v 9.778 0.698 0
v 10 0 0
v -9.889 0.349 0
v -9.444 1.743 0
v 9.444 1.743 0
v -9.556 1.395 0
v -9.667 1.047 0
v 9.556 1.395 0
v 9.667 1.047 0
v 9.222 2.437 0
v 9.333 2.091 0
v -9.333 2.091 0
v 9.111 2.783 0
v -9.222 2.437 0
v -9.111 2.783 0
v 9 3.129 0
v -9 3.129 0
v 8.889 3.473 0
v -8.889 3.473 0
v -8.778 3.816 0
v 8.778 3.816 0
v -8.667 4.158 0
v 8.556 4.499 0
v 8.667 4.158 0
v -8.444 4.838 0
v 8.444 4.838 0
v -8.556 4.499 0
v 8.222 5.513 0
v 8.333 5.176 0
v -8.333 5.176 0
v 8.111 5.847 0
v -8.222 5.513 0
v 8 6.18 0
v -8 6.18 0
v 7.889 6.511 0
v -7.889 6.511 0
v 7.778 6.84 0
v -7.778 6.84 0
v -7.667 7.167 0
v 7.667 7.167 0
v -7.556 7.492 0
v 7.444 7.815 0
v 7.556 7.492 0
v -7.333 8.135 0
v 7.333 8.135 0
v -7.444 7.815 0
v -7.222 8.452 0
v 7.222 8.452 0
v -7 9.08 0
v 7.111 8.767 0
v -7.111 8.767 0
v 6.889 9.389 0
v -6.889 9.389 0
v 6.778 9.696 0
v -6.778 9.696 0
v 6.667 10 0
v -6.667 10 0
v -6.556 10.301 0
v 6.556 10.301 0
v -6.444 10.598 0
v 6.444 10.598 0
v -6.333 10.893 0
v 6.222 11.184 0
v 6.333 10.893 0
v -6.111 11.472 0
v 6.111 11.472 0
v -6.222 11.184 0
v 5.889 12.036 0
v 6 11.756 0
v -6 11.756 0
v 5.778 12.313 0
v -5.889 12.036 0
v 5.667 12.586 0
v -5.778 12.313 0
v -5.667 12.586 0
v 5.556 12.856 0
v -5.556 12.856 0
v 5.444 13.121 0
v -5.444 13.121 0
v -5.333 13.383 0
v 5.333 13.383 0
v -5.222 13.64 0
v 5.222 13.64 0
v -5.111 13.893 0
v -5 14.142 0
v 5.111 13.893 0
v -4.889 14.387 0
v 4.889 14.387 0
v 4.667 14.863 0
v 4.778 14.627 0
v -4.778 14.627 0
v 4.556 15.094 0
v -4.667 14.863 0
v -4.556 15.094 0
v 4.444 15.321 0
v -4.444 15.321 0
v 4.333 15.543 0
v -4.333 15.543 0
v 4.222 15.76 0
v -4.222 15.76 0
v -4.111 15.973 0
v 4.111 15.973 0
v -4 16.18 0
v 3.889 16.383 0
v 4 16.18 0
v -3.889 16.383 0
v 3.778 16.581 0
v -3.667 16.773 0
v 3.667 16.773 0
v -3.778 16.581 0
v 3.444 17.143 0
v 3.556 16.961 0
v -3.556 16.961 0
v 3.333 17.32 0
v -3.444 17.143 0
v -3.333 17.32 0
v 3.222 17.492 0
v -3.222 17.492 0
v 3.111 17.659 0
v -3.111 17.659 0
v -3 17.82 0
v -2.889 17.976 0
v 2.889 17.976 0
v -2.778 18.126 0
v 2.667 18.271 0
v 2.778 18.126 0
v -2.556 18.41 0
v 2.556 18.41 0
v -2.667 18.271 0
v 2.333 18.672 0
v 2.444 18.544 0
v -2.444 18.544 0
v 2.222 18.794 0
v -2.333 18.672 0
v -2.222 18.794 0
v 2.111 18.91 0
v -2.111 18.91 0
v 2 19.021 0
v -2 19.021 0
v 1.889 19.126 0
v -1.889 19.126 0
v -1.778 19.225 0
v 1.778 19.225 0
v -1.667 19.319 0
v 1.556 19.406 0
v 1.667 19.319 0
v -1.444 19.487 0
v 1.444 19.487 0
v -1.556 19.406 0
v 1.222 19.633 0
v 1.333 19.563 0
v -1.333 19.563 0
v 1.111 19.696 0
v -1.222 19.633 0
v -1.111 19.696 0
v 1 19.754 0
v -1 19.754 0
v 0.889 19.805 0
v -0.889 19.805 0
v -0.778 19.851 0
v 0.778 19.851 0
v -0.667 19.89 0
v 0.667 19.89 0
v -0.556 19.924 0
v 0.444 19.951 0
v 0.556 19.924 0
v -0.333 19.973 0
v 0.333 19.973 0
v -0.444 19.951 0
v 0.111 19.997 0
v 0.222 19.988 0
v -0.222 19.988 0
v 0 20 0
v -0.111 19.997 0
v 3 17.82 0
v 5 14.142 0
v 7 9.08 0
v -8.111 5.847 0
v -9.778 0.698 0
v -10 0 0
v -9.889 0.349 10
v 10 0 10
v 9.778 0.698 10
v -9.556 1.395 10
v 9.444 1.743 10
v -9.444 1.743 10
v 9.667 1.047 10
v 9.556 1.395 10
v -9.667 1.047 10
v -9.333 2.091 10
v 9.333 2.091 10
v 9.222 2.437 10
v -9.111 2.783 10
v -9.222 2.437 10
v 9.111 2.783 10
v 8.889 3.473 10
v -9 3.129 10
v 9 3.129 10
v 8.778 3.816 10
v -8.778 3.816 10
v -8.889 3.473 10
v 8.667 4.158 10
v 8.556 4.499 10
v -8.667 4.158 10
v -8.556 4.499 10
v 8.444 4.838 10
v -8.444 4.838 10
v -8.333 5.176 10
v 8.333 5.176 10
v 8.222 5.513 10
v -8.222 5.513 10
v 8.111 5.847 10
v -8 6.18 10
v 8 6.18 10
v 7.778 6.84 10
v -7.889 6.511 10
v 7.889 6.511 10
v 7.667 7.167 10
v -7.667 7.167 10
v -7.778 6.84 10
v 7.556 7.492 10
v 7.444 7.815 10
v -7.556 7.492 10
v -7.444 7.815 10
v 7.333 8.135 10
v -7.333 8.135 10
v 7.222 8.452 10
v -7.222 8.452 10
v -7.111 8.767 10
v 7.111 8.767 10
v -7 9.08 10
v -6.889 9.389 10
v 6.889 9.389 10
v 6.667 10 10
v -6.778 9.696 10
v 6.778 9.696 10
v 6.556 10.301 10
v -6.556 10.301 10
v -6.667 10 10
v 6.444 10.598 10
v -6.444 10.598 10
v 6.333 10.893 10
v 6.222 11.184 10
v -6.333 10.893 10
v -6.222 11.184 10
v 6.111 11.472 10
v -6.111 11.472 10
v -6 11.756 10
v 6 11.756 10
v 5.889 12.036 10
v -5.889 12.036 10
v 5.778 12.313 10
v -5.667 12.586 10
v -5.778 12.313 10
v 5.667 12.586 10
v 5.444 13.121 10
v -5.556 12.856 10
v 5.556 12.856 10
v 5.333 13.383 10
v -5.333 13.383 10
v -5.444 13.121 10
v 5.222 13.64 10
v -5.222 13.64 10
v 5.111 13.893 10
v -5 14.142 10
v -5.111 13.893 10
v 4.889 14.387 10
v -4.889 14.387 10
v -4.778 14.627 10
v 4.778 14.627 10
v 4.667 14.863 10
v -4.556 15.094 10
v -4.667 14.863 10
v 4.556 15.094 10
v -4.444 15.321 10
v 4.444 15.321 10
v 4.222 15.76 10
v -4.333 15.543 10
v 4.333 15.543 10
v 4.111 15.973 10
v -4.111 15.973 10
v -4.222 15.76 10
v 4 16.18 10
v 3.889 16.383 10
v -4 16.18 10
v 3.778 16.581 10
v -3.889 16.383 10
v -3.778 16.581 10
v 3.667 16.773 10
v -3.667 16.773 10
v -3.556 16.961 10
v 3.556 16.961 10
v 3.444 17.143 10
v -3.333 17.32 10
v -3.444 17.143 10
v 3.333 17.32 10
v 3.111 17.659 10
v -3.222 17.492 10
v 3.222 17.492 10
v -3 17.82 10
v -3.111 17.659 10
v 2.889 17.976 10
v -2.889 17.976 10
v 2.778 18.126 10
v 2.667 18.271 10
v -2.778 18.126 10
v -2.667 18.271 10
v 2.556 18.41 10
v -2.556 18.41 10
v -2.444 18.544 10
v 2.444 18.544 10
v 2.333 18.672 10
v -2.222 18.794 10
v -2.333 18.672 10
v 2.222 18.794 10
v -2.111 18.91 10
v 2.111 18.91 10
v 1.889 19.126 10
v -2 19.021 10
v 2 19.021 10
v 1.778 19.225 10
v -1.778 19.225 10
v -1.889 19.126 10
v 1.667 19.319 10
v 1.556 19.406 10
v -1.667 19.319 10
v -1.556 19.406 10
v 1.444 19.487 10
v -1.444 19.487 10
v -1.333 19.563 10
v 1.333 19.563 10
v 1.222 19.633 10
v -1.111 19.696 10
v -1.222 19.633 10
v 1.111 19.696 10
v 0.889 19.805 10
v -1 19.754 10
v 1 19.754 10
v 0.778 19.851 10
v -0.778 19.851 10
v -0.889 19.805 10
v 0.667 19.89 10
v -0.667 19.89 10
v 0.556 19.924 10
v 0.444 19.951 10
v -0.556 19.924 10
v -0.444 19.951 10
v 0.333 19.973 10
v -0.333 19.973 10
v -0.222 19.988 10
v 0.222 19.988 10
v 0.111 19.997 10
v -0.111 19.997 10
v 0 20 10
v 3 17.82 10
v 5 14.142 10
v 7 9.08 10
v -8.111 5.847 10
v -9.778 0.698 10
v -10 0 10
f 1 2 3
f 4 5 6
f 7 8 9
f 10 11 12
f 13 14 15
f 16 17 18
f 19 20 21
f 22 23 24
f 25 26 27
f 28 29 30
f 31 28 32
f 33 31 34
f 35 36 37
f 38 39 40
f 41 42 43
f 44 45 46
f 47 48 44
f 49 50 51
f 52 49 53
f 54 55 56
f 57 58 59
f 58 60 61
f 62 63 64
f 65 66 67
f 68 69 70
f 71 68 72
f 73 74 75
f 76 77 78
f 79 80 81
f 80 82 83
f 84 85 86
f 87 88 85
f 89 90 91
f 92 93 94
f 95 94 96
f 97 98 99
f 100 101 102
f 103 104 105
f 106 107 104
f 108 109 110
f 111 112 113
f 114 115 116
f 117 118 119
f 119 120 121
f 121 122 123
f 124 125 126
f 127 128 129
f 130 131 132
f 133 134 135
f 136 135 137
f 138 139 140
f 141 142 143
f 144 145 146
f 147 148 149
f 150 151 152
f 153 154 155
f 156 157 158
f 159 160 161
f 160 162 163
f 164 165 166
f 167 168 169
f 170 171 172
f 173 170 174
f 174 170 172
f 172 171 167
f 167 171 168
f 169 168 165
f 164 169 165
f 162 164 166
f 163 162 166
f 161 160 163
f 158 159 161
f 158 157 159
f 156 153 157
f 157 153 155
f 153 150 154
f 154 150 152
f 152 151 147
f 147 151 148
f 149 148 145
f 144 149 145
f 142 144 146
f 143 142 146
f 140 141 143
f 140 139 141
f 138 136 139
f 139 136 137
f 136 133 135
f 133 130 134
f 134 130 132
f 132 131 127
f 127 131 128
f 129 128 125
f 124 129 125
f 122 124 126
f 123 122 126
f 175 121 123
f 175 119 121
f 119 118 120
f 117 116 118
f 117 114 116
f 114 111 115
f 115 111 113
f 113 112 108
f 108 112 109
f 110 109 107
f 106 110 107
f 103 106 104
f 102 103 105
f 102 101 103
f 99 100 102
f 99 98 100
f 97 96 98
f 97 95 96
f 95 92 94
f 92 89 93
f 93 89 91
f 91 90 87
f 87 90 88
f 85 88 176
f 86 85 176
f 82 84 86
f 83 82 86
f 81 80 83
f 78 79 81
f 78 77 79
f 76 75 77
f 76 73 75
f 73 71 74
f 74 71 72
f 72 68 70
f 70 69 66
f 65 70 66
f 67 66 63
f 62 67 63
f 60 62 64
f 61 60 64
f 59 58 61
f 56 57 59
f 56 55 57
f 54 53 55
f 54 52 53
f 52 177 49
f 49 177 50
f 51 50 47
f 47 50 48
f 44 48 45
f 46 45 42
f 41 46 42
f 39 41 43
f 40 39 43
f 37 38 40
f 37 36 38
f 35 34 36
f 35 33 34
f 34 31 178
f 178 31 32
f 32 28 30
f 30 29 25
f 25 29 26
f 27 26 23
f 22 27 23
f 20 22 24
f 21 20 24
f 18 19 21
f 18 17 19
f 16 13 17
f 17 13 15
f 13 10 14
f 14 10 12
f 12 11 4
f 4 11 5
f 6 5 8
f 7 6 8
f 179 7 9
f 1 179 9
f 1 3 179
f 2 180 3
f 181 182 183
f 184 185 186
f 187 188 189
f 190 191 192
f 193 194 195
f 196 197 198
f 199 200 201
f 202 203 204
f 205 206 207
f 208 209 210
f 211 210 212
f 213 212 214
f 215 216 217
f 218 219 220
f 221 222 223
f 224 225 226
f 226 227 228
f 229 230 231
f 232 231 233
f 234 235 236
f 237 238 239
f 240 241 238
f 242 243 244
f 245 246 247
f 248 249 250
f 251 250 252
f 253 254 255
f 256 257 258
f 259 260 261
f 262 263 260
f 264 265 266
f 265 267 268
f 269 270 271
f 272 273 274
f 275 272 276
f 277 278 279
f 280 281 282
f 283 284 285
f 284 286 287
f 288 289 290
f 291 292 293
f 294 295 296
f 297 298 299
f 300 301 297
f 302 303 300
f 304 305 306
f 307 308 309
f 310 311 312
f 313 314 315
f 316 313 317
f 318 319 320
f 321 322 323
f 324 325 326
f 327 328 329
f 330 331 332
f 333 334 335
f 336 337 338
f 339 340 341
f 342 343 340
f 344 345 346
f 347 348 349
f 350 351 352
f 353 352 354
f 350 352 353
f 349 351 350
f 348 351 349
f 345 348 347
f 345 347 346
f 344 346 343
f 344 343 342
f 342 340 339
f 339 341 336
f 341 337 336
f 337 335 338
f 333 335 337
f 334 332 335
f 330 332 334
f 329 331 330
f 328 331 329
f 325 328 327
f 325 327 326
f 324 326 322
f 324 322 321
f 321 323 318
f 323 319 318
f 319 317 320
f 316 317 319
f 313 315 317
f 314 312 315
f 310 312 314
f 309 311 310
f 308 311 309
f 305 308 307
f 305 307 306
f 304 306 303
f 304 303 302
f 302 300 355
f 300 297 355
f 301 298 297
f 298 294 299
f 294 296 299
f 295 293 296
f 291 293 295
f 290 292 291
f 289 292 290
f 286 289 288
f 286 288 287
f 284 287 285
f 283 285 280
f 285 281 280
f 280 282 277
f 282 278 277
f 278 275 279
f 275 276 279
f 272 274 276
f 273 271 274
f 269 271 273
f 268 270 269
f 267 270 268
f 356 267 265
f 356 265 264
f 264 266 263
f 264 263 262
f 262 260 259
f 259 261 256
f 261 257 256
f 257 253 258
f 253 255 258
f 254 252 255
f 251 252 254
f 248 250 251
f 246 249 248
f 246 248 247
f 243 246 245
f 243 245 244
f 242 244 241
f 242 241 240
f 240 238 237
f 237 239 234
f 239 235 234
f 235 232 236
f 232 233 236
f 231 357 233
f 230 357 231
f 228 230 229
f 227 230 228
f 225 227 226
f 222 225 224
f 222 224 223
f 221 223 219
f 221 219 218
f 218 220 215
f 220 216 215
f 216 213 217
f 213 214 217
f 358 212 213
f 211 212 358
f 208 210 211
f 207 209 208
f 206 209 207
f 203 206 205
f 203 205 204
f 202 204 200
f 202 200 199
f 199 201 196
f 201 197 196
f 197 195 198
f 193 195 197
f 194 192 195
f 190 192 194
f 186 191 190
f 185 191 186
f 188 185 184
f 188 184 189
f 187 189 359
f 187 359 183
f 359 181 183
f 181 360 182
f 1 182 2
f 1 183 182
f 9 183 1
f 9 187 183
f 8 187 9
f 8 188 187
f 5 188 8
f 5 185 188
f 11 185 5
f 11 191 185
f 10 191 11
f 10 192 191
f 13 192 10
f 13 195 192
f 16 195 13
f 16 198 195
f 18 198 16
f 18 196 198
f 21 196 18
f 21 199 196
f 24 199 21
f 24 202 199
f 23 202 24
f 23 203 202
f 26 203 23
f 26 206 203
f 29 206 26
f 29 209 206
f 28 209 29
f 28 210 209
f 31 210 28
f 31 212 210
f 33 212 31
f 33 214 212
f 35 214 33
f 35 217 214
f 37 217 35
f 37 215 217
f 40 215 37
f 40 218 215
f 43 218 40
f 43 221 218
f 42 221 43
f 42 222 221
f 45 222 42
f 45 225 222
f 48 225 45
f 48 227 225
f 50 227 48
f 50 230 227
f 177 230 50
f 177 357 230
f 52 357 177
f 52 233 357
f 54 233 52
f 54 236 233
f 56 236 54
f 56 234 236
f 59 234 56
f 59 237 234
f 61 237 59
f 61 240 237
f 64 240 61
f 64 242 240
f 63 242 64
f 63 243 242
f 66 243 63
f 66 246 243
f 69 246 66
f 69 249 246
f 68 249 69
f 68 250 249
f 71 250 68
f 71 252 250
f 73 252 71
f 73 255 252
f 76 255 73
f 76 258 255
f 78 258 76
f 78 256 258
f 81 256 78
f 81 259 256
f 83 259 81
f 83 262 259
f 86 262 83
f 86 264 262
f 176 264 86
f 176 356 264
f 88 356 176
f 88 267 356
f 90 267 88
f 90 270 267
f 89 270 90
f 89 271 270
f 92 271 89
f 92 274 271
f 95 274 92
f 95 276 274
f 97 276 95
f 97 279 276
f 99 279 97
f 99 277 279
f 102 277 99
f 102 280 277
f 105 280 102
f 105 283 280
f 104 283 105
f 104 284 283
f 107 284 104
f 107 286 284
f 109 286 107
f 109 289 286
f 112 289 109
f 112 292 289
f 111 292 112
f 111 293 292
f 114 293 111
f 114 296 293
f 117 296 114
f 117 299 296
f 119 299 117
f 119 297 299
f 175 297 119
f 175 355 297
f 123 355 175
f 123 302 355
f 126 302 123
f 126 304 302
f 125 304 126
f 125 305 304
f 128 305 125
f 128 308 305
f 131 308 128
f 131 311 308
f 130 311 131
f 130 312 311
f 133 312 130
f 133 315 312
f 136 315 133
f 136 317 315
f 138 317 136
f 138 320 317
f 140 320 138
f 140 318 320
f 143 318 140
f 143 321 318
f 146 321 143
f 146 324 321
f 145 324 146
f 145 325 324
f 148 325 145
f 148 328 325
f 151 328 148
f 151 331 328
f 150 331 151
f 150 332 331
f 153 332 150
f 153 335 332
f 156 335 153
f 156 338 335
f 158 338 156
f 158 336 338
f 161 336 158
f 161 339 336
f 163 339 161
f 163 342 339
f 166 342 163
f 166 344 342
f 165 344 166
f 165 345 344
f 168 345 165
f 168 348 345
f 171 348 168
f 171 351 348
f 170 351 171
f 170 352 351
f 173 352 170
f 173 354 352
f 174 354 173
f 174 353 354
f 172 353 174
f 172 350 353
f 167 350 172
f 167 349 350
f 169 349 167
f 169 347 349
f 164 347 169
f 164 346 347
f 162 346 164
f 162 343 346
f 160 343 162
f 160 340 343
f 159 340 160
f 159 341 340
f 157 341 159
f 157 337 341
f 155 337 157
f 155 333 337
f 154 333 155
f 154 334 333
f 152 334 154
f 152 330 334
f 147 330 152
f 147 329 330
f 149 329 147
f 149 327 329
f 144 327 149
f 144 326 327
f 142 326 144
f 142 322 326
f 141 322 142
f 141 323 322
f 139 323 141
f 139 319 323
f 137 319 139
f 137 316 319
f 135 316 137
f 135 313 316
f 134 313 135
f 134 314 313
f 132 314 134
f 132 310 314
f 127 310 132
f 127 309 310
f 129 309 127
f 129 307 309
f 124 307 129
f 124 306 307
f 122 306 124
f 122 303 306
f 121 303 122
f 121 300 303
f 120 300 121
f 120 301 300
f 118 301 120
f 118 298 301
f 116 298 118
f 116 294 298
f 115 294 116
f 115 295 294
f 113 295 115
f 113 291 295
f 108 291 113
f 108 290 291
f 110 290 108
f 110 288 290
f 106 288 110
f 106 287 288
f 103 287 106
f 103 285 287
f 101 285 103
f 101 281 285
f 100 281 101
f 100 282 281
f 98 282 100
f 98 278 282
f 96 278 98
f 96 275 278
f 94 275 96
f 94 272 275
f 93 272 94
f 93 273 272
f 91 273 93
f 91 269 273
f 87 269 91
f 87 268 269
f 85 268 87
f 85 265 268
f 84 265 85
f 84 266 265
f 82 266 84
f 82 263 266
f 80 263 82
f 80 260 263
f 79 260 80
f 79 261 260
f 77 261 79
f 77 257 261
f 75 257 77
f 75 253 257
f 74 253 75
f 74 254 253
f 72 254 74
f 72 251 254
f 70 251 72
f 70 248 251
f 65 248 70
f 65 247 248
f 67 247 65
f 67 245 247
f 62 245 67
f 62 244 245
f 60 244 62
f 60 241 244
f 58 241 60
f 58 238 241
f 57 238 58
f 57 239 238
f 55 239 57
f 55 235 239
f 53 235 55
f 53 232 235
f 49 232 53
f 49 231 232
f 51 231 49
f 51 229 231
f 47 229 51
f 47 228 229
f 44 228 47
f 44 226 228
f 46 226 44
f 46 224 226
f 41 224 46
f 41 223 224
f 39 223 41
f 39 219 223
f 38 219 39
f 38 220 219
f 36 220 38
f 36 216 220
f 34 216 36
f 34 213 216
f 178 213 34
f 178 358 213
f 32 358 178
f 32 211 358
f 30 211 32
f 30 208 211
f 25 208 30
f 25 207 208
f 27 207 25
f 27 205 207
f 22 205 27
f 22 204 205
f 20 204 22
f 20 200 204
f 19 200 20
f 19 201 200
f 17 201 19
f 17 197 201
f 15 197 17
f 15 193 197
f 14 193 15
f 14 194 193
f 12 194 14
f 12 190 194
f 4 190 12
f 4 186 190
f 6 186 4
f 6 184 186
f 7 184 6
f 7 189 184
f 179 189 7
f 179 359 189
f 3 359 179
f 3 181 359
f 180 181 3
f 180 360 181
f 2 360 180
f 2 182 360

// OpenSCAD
// unit sine-wave 0-359 deg for doing projections onto other solids
// below python code used to print points list:

/*
import numpy as np
"""
output a list of points consumable by openscad polygon function
"""

def wave(degs, scale=10):
    pts = []
    for i in xrange(degs):
        rad = i*np.pi/180.0
        x = float(i/180.0*scale)
        y=np.sin(rad) * scale
        pts.append([x, y])
    return pts

def pwave(degs, scale=20):
    # default scale of 20 would give: 0 < x < 40 units
    print("sinepoints = {};".format(wave(degs, scale=scale)))
    print("*** finito ***")
    return 0

if __name__ == "__main__":
    pwave(359, scale=100)
*/


sinepoints = [[0.0, 0.0], [0.11111111111111112, 0.34904812874567026], [0.22222222222222224, 0.69798993405001941], [0.3333333333333333, 1.0467191248588765], [0.4444444444444445, 1.395129474882506], [0.5555555555555556, 1.7431148549531632], [0.6666666666666666, 2.0905692653530692], [0.7777777777777778, 2.4373868681029496], [0.888888888888889, 2.7834620192013086], [1.0, 3.1286893008046173], [1.1111111111111112, 3.4729635533386065], [1.222222222222222, 3.8161799075308962], [1.3333333333333333, 4.1582338163551862], [1.4444444444444442, 4.4990210868773], [1.5555555555555556, 4.8384379119933545], [1.6666666666666665, 5.1763809020504148], [1.777777777777778, 5.512747116339983], [1.8888888888888888, 5.8474340944547354], [2.0, 6.1803398874989481], [2.111111111111111, 6.5113630891431331], [2.2222222222222223, 6.840402866513374], [2.3333333333333335, 7.1673589909060054], [2.444444444444444, 7.4921318683182401], [2.5555555555555554, 7.8146225697854739], [2.6666666666666665, 8.1347328615160031], [2.7777777777777777, 8.452365234813989], [2.8888888888888884, 8.7674229357815481], [3.0, 9.079809994790935], [3.111111111111111, 9.3894312557178168], [3.2222222222222223, 9.6961924049267409], [3.333333333333333, 9.9999999999999982], [3.4444444444444446, 10.300761498201084], [3.555555555555556, 10.598385284664097], [3.6666666666666665, 10.892780700300541], [3.7777777777777777, 11.183858069414939], [3.888888888888889, 11.471528727020921], [4.0, 11.755705045849464], [4.111111111111111, 12.036300463040966], [4.222222222222222, 12.313229506513164], [4.333333333333334, 12.586407820996747], [4.444444444444445, 12.855752193730785], [4.555555555555555, 13.121180579810144], [4.666666666666667, 13.382612127177165], [4.777777777777778, 13.63996720124997], [4.888888888888888, 13.893167409179945], [5.0, 14.142135623730949], [5.111111111111111, 14.386796006773022], [5.222222222222222, 14.627074032383408], [5.333333333333333, 14.862896509547882], [5.444444444444444, 15.094191604455441], [5.555555555555555, 15.32088886237956], [5.666666666666666, 15.542919229139416], [5.777777777777777, 15.760215072134439], [5.888888888888889, 15.972710200945857], [6.0, 16.180339887498949], [6.111111111111112, 16.383040885779835], [6.222222222222222, 16.580751451100834], [6.333333333333333, 16.773411358908479], [6.444444444444445, 16.960961923128519], [6.555555555555555, 17.143346014042244], [6.666666666666666, 17.320508075688771], [6.777777777777779, 17.492394142787916], [6.888888888888889, 17.658951857178536], [7.0, 17.820130483767358], [7.111111111111112, 17.97588092598334], [7.222222222222222, 18.126155740732997], [7.333333333333333, 18.270909152852017], [7.444444444444445, 18.410097069048806], [7.555555555555555, 18.543677091335748], [7.666666666666667, 18.671608529944034], [7.777777777777778, 18.793852415718167], [7.888888888888888, 18.910371511986334], [8.0, 19.021130325903069], [8.11111111111111, 19.126095119260707], [8.222222222222221, 19.225233918766378], [8.333333333333334, 19.318516525781366], [8.444444444444445, 19.405914525519929], [8.555555555555555, 19.487401295704704], [8.666666666666668, 19.56295201467611], [8.777777777777779, 19.632543668953279], [8.88888888888889, 19.696155060244159], [9.0, 19.753766811902757], [9.11111111111111, 19.805361374831406], [9.222222222222223, 19.85092303282644], [9.333333333333334, 19.890437907365467], [9.444444444444445, 19.92389396183491], [9.555555555555555, 19.951281005196485], [9.666666666666666, 19.972590695091476], [9.777777777777777, 19.987816540381914], [9.88888888888889, 19.996953903127825], [10.0, 20.0], [10.11111111111111, 19.996953903127825], [10.222222222222221, 19.987816540381914], [10.333333333333334, 19.972590695091476], [10.444444444444445, 19.951281005196485], [10.555555555555555, 19.92389396183491], [10.666666666666666, 19.890437907365467], [10.777777777777777, 19.850923032826444], [10.888888888888888, 19.805361374831406], [11.0, 19.753766811902754], [11.11111111111111, 19.696155060244159], [11.222222222222221, 19.632543668953279], [11.333333333333332, 19.562952014676114], [11.444444444444443, 19.487401295704704], [11.555555555555554, 19.405914525519929], [11.666666666666668, 19.318516525781366], [11.777777777777779, 19.225233918766378], [11.88888888888889, 19.126095119260711], [12.0, 19.021130325903073], [12.11111111111111, 18.910371511986337], [12.222222222222223, 18.79385241571817], [12.333333333333334, 18.671608529944034], [12.444444444444445, 18.543677091335748], [12.555555555555555, 18.410097069048806], [12.666666666666666, 18.27090915285202], [12.777777777777777, 18.126155740733001], [12.88888888888889, 17.97588092598334], [13.0, 17.820130483767358], [13.11111111111111, 17.658951857178543], [13.222222222222221, 17.492394142787916], [13.333333333333332, 17.320508075688775], [13.444444444444446, 17.143346014042248], [13.555555555555557, 16.960961923128522], [13.666666666666668, 16.773411358908479], [13.777777777777779, 16.580751451100834], [13.88888888888889, 16.383040885779842], [14.0, 16.180339887498949], [14.111111111111112, 15.972710200945855], [14.222222222222223, 15.760215072134439], [14.333333333333334, 15.54291922913942], [14.444444444444445, 15.32088886237956], [14.555555555555555, 15.094191604455435], [14.666666666666666, 14.862896509547884], [14.777777777777779, 14.627074032383412], [14.88888888888889, 14.386796006773029], [15.0, 14.142135623730951], [15.11111111111111, 13.893167409179943], [15.222222222222221, 13.639967201249972], [15.333333333333334, 13.382612127177167], [15.444444444444445, 13.121180579810146], [15.555555555555555, 12.85575219373079], [15.666666666666666, 12.586407820996754], [15.777777777777777, 12.313229506513167], [15.888888888888888, 12.036300463040963], [16.0, 11.755705045849465], [16.11111111111111, 11.471528727020928], [16.22222222222222, 11.183858069414939], [16.333333333333332, 10.892780700300539], [16.444444444444443, 10.598385284664097], [16.555555555555554, 10.300761498201087], [16.666666666666668, 9.9999999999999982], [16.77777777777778, 9.6961924049267427], [16.88888888888889, 9.3894312557178221], [17.0, 9.0798099947909368], [17.11111111111111, 8.7674229357815463], [17.22222222222222, 8.452365234813989], [17.333333333333336, 8.1347328615160084], [17.444444444444443, 7.8146225697854828], [17.555555555555557, 7.4921318683182445], [17.666666666666664, 7.1673589909060045], [17.77777777777778, 6.8404028665133776], [17.88888888888889, 6.5113630891431402], [18.0, 6.1803398874989499], [18.11111111111111, 5.8474340944547407], [18.22222222222222, 5.5127471163399928], [18.333333333333332, 5.1763809020504201], [18.444444444444446, 4.8384379119933545], [18.555555555555557, 4.4990210868772955], [18.666666666666668, 4.1582338163551862], [18.77777777777778, 3.8161799075308993], [18.88888888888889, 3.4729635533386056], [19.0, 3.1286893008046195], [19.11111111111111, 2.7834620192013149], [19.22222222222222, 2.4373868681029509], [19.333333333333332, 2.0905692653530745], [19.444444444444443, 1.7431148549531728], [19.555555555555554, 1.3951294748825105], [19.666666666666664, 1.0467191248588761], [19.77777777777778, 0.69798993405001397], [19.88888888888889, 0.34904812874566876], [20.0, 2.4492935982947065e-15], [20.11111111111111, -0.34904812874566382], [20.22222222222222, -0.69798993405001797], [20.333333333333332, -1.0467191248588712], [20.444444444444443, -1.3951294748824967], [20.555555555555554, -1.7431148549531588], [20.666666666666668, -2.0905692653530612], [20.77777777777778, -2.4373868681029549], [20.88888888888889, -2.7834620192013104], [21.0, -3.1286893008046146], [21.11111111111111, -3.4729635533386096], [21.22222222222222, -3.8161799075308944], [21.333333333333332, -4.1582338163551817], [21.444444444444443, -4.4990210868772991], [21.555555555555554, -4.83843791199335], [21.666666666666664, -5.1763809020504068], [21.777777777777775, -5.5127471163399804], [21.888888888888893, -5.8474340944547274], [22.0, -6.1803398874989544], [22.111111111111114, -6.5113630891431349], [22.22222222222222, -6.8404028665133731], [22.333333333333336, -7.1673589909060089], [22.444444444444443, -7.4921318683182401], [22.555555555555557, -7.8146225697854712], [22.666666666666664, -8.1347328615159959], [22.77777777777778, -8.4523652348139855], [22.888888888888886, -8.767422935781541], [23.0, -9.0798099947909243], [23.111111111111107, -9.3894312557178168], [23.222222222222225, -9.6961924049267392], [23.333333333333336, -10.000000000000002], [23.444444444444446, -10.300761498201084], [23.555555555555557, -10.598385284664095], [23.666666666666668, -10.892780700300541], [23.77777777777778, -11.183858069414933], [23.88888888888889, -11.471528727020917], [24.0, -11.75570504584946], [24.11111111111111, -12.036300463040961], [24.22222222222222, -12.313229506513157], [24.333333333333332, -12.586407820996753], [24.444444444444446, -12.855752193730785], [24.555555555555557, -13.121180579810147], [24.666666666666668, -13.382612127177165], [24.77777777777778, -13.639967201249966], [24.88888888888889, -13.893167409179947], [25.0, -14.142135623730949], [25.11111111111111, -14.386796006773018], [25.22222222222222, -14.627074032383403], [25.333333333333332, -14.86289650954788], [25.444444444444443, -15.094191604455434], [25.555555555555554, -15.320888862379558], [25.666666666666668, -15.542919229139422], [25.77777777777778, -15.760215072134443], [25.88888888888889, -15.972710200945857], [26.0, -16.180339887498945], [26.11111111111111, -16.383040885779831], [26.22222222222222, -16.580751451100827], [26.333333333333332, -16.773411358908483], [26.444444444444443, -16.960961923128519], [26.555555555555554, -17.143346014042244], [26.666666666666664, -17.320508075688767], [26.777777777777775, -17.492394142787919], [26.888888888888893, -17.65895185717854], [27.0, -17.820130483767358], [27.111111111111114, -17.975880925983336], [27.22222222222222, -18.126155740732994], [27.333333333333336, -18.27090915285202], [27.444444444444443, -18.410097069048806], [27.555555555555557, -18.543677091335745], [27.666666666666664, -18.671608529944031], [27.77777777777778, -18.793852415718163], [27.888888888888886, -18.910371511986337], [28.0, -19.021130325903069], [28.111111111111107, -19.126095119260707], [28.222222222222225, -19.225233918766381], [28.333333333333336, -19.318516525781366], [28.444444444444446, -19.405914525519929], [28.555555555555557, -19.487401295704704], [28.666666666666668, -19.56295201467611], [28.77777777777778, -19.632543668953279], [28.88888888888889, -19.696155060244159], [29.0, -19.753766811902754], [29.11111111111111, -19.805361374831406], [29.22222222222222, -19.850923032826444], [29.333333333333332, -19.890437907365467], [29.444444444444446, -19.92389396183491], [29.555555555555557, -19.951281005196485], [29.666666666666668, -19.972590695091476], [29.77777777777778, -19.987816540381914], [29.88888888888889, -19.996953903127825], [30.0, -20.0], [30.11111111111111, -19.996953903127825], [30.22222222222222, -19.987816540381914], [30.333333333333332, -19.972590695091476], [30.444444444444443, -19.951281005196485], [30.555555555555554, -19.92389396183491], [30.666666666666668, -19.890437907365467], [30.77777777777778, -19.85092303282644], [30.88888888888889, -19.805361374831406], [31.0, -19.753766811902757], [31.11111111111111, -19.696155060244163], [31.22222222222222, -19.632543668953282], [31.333333333333332, -19.562952014676117], [31.444444444444443, -19.487401295704704], [31.555555555555554, -19.405914525519933], [31.666666666666664, -19.318516525781362], [31.777777777777775, -19.225233918766374], [31.888888888888893, -19.126095119260707], [32.0, -19.021130325903073], [32.111111111111114, -18.910371511986341], [32.22222222222222, -18.79385241571817], [32.333333333333336, -18.671608529944042], [32.44444444444444, -18.543677091335748], [32.55555555555556, -18.41009706904881], [32.666666666666664, -18.270909152852013], [32.77777777777778, -18.126155740732997], [32.888888888888886, -17.97588092598334], [33.0, -17.820130483767358], [33.11111111111111, -17.658951857178543], [33.22222222222222, -17.492394142787923], [33.333333333333336, -17.320508075688771], [33.44444444444444, -17.143346014042248], [33.55555555555556, -16.960961923128522], [33.666666666666664, -16.773411358908486], [33.77777777777778, -16.580751451100841], [33.888888888888886, -16.383040885779835], [34.0, -16.180339887498953], [34.11111111111111, -15.972710200945862], [34.22222222222222, -15.760215072134436], [34.33333333333333, -15.542919229139416], [34.44444444444444, -15.320888862379562], [34.55555555555556, -15.094191604455444], [34.66666666666667, -14.862896509547891], [34.77777777777778, -14.627074032383421], [34.888888888888886, -14.386796006773036], [35.0, -14.142135623730955], [35.111111111111114, -13.893167409179952], [35.22222222222222, -13.639967201249965], [35.33333333333333, -13.382612127177163], [35.44444444444444, -13.121180579810147], [35.55555555555556, -12.855752193730792], [35.66666666666667, -12.586407820996756], [35.77777777777778, -12.313229506513178], [35.88888888888889, -12.036300463040966], [36.0, -11.755705045849467], [36.111111111111114, -11.47152872702093], [36.22222222222222, -11.183858069414947], [36.333333333333336, -10.892780700300539], [36.44444444444444, -10.598385284664115], [36.55555555555556, -10.300761498201091], [36.666666666666664, -10.000000000000009], [36.77777777777778, -9.6961924049267374], [36.88888888888889, -9.3894312557178168], [37.0, -9.0798099947909385], [37.111111111111114, -8.767422935781541], [37.22222222222222, -8.4523652348139997], [37.333333333333336, -8.1347328615160031], [37.44444444444444, -7.8146225697854943], [37.55555555555556, -7.4921318683182472], [37.666666666666664, -7.1673589909060151], [37.77777777777778, -6.8404028665133723], [37.888888888888886, -6.5113630891431509], [38.0, -6.1803398874989526], [38.11111111111111, -5.8474340944547256], [38.22222222222222, -5.5127471163399955], [38.333333333333336, -5.1763809020504139], [38.44444444444444, -4.8384379119933572], [38.55555555555556, -4.4990210868773071], [38.666666666666664, -4.1582338163551977], [38.77777777777778, -3.8161799075308931], [38.888888888888886, -3.4729635533386256], [39.0, -3.1286893008046217], [39.11111111111111, -2.7834620192013175], [39.22222222222222, -2.4373868681029625], [39.33333333333333, -2.0905692653530683], [39.44444444444444, -1.7431148549531663], [39.55555555555556, -1.3951294748824952], [39.66666666666667, -1.0467191248588874], [39.77777777777778, -0.69798993405001641]];

// normto uses maxval of the points included in portion 
module sinewave(portion=359, normto=10){
    part = min(len(sinepoints), portion);
    used_p = [for(i=[0:part]) sinepoints[i]];
    pp = concat(used_p, [[used_p[len(used_p)-1][0], 0]]);
    spot = -max([for(i=pp) i[1]]) / 2;
    echo("max value of:", spot, " moved to x=zero");
    translate([spot, 0,0])
        scale([normto/abs(spot), normto/abs(spot)])
            polygon(points=pp);
}

linear_extrude(convexity=10, height=10){
    sinewave(portion=180);}
